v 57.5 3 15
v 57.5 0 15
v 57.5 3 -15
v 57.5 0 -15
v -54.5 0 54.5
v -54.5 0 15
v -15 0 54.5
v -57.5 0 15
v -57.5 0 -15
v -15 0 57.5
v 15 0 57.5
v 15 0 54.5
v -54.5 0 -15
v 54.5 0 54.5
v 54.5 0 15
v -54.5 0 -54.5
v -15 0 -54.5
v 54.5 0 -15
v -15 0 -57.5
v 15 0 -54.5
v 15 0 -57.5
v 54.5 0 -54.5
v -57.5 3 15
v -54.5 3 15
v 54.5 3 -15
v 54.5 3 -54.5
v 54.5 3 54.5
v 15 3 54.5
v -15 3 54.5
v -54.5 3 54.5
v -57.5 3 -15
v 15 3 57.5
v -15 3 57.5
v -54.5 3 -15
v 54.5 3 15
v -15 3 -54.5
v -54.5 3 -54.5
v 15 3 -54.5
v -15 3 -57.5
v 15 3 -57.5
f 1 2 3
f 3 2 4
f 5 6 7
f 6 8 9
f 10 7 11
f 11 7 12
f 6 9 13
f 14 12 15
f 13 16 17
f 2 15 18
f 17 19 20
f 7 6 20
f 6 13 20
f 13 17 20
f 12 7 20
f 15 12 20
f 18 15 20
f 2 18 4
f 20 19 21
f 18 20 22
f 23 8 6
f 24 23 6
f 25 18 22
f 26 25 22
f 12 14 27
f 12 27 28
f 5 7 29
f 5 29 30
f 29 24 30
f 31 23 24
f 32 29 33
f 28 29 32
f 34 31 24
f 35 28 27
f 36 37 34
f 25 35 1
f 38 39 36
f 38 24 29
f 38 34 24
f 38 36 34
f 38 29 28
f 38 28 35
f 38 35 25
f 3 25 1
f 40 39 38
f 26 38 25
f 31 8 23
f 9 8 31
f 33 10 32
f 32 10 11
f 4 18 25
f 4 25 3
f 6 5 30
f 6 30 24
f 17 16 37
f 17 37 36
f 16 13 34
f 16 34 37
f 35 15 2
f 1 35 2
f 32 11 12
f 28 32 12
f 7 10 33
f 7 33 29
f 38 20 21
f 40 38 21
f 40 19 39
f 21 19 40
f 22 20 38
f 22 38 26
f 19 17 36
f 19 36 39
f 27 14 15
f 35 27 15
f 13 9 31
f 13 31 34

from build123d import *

# Parameters (mm, degrees)
SKETCH1_W           = 30
SKETCH1_H           = 3
SKETCH1_W_2         = 3
SKETCH1_H_2         = 30
BOSS_EXTRUDE1_DEPTH = 3


with BuildPart() as part:
    # Sketch1 → Boss-Extrude1 (new body)
    with BuildSketch(Plane(origin=(0, 0, 0), x_dir=(1, 0, 0), z_dir=(0, 1, 0))):
        with Locations((0, -56)):
            Rectangle(SKETCH1_W, SKETCH1_H)
        with Locations((-56, 0)):
            Rectangle(SKETCH1_W_2, SKETCH1_H_2)
        with Locations((0, 56)):
            Rectangle(SKETCH1_W, SKETCH1_H)
        Polygon((-54.5, -54.5), (-54.5, -15), (-54.5, 15), (-54.5, 54.5), (-15, 54.5), (15, 54.5), (54.5, 54.5), (54.5, 15), (54.5, -15), (54.5, -54.5), (15, -54.5), (-15, -54.5), align=None)
        with Locations((56, 0)):
            Rectangle(SKETCH1_W_2, SKETCH1_H_2)
    extrude(amount=BOSS_EXTRUDE1_DEPTH)


solid = part.part
